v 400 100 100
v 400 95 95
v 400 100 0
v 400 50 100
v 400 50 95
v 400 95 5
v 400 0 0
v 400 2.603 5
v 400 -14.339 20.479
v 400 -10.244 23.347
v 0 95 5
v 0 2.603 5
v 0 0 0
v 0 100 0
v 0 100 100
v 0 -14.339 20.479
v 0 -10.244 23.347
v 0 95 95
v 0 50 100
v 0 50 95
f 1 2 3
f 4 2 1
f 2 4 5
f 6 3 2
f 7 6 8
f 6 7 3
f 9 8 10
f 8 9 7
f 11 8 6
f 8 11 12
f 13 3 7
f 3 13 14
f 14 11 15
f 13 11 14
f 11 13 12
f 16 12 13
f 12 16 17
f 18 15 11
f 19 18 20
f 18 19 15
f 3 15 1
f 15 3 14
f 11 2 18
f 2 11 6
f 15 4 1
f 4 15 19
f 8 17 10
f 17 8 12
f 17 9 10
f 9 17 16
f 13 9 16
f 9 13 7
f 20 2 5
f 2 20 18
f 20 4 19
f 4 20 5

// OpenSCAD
$fn=10;

// std dimensions 
width = 400;
depth = 100;
height = 5;

// front wall dimensions 
front_wall_height = 25;
front_wall_angle = 55;

// top dimensions
top_depth = 50;

// base
cube([width,depth,height]);

// back wall
translate([0,depth,0]){
	rotate([90,0,0]){
		cube([width,depth,height]);
	}
}

// front wall
translate([width,0,0]){
	rotate([front_wall_angle,0,180]){
		cube([width,front_wall_height,height]);
	}
}

// top holder
translate([0,depth-top_depth,depth-height])
cube([width,top_depth,height]);
